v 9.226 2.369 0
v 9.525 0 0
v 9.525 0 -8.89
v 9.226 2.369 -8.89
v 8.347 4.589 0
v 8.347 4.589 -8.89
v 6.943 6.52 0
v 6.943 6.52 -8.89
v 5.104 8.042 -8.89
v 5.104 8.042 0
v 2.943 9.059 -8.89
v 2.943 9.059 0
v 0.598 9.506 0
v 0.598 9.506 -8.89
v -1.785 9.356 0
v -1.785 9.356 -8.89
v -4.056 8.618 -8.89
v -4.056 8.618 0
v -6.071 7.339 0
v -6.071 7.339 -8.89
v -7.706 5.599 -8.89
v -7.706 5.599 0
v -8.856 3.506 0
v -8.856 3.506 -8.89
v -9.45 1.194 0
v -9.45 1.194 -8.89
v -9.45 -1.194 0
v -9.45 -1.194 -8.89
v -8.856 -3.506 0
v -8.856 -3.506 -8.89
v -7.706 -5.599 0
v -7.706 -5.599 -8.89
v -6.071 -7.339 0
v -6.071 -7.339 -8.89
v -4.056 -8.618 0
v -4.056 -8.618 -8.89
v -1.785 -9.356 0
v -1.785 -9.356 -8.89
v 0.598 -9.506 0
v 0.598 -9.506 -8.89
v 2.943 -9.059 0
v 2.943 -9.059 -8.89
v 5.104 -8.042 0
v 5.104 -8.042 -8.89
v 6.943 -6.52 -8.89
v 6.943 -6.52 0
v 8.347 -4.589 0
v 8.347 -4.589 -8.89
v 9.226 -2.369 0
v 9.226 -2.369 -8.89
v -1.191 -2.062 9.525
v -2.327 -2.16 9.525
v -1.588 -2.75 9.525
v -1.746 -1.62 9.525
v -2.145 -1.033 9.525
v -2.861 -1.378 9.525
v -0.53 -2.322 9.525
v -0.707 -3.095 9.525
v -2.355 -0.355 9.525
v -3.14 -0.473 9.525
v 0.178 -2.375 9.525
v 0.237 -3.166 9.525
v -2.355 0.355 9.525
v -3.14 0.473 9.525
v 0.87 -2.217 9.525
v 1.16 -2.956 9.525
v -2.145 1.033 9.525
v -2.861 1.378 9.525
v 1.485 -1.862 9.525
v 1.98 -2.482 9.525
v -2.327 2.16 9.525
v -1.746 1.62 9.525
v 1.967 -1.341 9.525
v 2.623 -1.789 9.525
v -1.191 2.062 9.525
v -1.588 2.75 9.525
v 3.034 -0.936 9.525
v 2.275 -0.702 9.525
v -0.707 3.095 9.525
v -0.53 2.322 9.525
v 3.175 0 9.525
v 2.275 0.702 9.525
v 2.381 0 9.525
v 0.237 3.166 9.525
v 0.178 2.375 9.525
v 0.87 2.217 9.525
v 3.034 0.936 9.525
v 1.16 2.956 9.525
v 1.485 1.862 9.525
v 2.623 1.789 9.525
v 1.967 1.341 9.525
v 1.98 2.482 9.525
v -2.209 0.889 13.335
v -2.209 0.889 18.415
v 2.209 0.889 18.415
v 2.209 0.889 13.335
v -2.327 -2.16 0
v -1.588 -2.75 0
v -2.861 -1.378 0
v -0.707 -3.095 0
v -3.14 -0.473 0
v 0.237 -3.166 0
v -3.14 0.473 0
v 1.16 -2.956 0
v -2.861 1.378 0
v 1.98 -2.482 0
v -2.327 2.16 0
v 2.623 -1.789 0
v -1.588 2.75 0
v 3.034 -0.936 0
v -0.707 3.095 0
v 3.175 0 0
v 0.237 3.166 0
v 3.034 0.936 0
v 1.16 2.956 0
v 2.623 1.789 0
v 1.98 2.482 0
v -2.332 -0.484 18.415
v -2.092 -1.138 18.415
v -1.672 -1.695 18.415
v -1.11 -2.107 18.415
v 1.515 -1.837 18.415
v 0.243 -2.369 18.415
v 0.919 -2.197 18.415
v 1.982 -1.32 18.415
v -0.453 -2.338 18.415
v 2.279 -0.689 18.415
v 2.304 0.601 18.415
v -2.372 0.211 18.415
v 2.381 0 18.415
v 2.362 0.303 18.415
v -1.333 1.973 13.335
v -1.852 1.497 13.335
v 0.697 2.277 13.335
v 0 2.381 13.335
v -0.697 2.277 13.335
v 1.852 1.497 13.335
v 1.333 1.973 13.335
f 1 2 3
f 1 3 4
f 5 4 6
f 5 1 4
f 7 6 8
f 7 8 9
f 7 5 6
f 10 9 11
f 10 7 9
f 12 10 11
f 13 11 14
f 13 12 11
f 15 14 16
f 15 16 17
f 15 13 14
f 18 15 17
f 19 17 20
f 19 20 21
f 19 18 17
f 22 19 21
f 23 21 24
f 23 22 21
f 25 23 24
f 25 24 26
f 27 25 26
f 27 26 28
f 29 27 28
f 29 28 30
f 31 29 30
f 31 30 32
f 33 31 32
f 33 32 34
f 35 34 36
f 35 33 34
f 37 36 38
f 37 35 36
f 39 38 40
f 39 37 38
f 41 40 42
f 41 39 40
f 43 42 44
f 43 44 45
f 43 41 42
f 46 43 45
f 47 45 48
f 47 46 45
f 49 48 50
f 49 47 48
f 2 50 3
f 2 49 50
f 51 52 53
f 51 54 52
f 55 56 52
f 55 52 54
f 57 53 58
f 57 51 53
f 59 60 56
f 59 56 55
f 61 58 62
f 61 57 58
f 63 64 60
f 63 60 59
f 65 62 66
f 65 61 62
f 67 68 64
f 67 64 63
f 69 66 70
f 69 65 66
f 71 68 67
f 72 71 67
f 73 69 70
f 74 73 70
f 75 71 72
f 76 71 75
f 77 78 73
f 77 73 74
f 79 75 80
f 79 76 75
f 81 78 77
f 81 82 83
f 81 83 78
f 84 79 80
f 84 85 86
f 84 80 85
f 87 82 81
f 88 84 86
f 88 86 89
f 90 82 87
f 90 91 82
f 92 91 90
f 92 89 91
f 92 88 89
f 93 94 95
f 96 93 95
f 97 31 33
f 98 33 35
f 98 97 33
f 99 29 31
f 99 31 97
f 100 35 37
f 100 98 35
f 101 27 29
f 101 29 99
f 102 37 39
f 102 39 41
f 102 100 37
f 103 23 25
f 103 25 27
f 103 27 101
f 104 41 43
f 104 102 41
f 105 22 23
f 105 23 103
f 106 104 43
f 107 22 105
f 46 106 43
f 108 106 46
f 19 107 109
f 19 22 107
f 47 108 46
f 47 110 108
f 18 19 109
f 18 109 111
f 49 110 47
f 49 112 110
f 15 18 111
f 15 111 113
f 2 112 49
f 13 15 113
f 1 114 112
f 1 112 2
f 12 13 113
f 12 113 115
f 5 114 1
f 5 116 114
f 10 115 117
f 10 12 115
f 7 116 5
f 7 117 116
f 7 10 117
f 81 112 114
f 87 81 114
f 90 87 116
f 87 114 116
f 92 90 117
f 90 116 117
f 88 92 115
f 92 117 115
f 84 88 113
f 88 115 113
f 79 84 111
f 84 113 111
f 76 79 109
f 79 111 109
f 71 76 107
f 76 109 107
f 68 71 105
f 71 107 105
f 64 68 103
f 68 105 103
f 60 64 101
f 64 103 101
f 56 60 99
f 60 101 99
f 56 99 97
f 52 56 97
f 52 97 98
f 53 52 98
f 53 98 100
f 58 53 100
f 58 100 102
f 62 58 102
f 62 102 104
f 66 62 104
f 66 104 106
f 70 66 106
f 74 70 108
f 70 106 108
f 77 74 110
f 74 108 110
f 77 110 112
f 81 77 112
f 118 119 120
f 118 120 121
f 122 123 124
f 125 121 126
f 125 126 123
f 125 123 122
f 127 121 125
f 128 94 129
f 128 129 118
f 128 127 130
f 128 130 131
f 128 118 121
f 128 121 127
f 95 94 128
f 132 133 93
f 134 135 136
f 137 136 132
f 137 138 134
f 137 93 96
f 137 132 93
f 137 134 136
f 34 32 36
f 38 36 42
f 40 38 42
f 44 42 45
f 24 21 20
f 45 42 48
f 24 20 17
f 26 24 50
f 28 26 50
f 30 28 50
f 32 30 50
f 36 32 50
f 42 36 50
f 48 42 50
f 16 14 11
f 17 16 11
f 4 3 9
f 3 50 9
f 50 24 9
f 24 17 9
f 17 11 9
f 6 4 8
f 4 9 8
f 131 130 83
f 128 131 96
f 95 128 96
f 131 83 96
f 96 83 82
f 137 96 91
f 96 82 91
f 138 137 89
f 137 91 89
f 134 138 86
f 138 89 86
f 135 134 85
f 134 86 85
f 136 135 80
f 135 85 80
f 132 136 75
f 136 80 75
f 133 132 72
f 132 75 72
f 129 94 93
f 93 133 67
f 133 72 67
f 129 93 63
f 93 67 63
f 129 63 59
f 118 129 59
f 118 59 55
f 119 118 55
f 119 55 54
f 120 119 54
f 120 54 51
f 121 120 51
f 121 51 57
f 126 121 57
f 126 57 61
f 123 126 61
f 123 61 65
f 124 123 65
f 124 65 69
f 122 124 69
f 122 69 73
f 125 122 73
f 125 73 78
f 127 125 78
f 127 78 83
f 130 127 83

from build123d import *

# Parameters (mm, degrees)
SKETCH1_R           = 9.525
BOSS_EXTRUDE1_DEPTH = 8.89
SKETCH2_R           = 3.175
BOSS_EXTRUDE2_DEPTH = 9.525
SKETCH3_R           = 2.38125
BOSS_EXTRUDE3_DEPTH = 8.89
CUT_EXTRUDE1_DEPTH  = 5.08


with BuildPart() as part:
    # Sketch1 → Boss-Extrude1 (new body)
    with BuildSketch(Plane.XY):
        Circle(SKETCH1_R)
    extrude(amount=-BOSS_EXTRUDE1_DEPTH)

    # Sketch2 → Boss-Extrude2 (add)
    with BuildSketch(Plane.XY):
        Circle(SKETCH2_R)
    extrude(amount=BOSS_EXTRUDE2_DEPTH)

    # Sketch3 → Boss-Extrude3 (add)
    with BuildSketch(Plane.XY.offset(9.525)):
        Circle(SKETCH3_R)
    extrude(amount=BOSS_EXTRUDE3_DEPTH)

    # Sketch4 → Cut-Extrude1 (cut)
    with BuildSketch(Plane.XY.offset(18.415)):
        with BuildLine():
            Line((-4.269996199, 0.889), (4.269996199, 0.889))
            ThreePointArc((4.269996199, 0.889), (0, 5.158996199), (-4.269996199, 0.889))
        make_face()
    extrude(amount=-CUT_EXTRUDE1_DEPTH, mode=Mode.SUBTRACT)


solid = part.part
